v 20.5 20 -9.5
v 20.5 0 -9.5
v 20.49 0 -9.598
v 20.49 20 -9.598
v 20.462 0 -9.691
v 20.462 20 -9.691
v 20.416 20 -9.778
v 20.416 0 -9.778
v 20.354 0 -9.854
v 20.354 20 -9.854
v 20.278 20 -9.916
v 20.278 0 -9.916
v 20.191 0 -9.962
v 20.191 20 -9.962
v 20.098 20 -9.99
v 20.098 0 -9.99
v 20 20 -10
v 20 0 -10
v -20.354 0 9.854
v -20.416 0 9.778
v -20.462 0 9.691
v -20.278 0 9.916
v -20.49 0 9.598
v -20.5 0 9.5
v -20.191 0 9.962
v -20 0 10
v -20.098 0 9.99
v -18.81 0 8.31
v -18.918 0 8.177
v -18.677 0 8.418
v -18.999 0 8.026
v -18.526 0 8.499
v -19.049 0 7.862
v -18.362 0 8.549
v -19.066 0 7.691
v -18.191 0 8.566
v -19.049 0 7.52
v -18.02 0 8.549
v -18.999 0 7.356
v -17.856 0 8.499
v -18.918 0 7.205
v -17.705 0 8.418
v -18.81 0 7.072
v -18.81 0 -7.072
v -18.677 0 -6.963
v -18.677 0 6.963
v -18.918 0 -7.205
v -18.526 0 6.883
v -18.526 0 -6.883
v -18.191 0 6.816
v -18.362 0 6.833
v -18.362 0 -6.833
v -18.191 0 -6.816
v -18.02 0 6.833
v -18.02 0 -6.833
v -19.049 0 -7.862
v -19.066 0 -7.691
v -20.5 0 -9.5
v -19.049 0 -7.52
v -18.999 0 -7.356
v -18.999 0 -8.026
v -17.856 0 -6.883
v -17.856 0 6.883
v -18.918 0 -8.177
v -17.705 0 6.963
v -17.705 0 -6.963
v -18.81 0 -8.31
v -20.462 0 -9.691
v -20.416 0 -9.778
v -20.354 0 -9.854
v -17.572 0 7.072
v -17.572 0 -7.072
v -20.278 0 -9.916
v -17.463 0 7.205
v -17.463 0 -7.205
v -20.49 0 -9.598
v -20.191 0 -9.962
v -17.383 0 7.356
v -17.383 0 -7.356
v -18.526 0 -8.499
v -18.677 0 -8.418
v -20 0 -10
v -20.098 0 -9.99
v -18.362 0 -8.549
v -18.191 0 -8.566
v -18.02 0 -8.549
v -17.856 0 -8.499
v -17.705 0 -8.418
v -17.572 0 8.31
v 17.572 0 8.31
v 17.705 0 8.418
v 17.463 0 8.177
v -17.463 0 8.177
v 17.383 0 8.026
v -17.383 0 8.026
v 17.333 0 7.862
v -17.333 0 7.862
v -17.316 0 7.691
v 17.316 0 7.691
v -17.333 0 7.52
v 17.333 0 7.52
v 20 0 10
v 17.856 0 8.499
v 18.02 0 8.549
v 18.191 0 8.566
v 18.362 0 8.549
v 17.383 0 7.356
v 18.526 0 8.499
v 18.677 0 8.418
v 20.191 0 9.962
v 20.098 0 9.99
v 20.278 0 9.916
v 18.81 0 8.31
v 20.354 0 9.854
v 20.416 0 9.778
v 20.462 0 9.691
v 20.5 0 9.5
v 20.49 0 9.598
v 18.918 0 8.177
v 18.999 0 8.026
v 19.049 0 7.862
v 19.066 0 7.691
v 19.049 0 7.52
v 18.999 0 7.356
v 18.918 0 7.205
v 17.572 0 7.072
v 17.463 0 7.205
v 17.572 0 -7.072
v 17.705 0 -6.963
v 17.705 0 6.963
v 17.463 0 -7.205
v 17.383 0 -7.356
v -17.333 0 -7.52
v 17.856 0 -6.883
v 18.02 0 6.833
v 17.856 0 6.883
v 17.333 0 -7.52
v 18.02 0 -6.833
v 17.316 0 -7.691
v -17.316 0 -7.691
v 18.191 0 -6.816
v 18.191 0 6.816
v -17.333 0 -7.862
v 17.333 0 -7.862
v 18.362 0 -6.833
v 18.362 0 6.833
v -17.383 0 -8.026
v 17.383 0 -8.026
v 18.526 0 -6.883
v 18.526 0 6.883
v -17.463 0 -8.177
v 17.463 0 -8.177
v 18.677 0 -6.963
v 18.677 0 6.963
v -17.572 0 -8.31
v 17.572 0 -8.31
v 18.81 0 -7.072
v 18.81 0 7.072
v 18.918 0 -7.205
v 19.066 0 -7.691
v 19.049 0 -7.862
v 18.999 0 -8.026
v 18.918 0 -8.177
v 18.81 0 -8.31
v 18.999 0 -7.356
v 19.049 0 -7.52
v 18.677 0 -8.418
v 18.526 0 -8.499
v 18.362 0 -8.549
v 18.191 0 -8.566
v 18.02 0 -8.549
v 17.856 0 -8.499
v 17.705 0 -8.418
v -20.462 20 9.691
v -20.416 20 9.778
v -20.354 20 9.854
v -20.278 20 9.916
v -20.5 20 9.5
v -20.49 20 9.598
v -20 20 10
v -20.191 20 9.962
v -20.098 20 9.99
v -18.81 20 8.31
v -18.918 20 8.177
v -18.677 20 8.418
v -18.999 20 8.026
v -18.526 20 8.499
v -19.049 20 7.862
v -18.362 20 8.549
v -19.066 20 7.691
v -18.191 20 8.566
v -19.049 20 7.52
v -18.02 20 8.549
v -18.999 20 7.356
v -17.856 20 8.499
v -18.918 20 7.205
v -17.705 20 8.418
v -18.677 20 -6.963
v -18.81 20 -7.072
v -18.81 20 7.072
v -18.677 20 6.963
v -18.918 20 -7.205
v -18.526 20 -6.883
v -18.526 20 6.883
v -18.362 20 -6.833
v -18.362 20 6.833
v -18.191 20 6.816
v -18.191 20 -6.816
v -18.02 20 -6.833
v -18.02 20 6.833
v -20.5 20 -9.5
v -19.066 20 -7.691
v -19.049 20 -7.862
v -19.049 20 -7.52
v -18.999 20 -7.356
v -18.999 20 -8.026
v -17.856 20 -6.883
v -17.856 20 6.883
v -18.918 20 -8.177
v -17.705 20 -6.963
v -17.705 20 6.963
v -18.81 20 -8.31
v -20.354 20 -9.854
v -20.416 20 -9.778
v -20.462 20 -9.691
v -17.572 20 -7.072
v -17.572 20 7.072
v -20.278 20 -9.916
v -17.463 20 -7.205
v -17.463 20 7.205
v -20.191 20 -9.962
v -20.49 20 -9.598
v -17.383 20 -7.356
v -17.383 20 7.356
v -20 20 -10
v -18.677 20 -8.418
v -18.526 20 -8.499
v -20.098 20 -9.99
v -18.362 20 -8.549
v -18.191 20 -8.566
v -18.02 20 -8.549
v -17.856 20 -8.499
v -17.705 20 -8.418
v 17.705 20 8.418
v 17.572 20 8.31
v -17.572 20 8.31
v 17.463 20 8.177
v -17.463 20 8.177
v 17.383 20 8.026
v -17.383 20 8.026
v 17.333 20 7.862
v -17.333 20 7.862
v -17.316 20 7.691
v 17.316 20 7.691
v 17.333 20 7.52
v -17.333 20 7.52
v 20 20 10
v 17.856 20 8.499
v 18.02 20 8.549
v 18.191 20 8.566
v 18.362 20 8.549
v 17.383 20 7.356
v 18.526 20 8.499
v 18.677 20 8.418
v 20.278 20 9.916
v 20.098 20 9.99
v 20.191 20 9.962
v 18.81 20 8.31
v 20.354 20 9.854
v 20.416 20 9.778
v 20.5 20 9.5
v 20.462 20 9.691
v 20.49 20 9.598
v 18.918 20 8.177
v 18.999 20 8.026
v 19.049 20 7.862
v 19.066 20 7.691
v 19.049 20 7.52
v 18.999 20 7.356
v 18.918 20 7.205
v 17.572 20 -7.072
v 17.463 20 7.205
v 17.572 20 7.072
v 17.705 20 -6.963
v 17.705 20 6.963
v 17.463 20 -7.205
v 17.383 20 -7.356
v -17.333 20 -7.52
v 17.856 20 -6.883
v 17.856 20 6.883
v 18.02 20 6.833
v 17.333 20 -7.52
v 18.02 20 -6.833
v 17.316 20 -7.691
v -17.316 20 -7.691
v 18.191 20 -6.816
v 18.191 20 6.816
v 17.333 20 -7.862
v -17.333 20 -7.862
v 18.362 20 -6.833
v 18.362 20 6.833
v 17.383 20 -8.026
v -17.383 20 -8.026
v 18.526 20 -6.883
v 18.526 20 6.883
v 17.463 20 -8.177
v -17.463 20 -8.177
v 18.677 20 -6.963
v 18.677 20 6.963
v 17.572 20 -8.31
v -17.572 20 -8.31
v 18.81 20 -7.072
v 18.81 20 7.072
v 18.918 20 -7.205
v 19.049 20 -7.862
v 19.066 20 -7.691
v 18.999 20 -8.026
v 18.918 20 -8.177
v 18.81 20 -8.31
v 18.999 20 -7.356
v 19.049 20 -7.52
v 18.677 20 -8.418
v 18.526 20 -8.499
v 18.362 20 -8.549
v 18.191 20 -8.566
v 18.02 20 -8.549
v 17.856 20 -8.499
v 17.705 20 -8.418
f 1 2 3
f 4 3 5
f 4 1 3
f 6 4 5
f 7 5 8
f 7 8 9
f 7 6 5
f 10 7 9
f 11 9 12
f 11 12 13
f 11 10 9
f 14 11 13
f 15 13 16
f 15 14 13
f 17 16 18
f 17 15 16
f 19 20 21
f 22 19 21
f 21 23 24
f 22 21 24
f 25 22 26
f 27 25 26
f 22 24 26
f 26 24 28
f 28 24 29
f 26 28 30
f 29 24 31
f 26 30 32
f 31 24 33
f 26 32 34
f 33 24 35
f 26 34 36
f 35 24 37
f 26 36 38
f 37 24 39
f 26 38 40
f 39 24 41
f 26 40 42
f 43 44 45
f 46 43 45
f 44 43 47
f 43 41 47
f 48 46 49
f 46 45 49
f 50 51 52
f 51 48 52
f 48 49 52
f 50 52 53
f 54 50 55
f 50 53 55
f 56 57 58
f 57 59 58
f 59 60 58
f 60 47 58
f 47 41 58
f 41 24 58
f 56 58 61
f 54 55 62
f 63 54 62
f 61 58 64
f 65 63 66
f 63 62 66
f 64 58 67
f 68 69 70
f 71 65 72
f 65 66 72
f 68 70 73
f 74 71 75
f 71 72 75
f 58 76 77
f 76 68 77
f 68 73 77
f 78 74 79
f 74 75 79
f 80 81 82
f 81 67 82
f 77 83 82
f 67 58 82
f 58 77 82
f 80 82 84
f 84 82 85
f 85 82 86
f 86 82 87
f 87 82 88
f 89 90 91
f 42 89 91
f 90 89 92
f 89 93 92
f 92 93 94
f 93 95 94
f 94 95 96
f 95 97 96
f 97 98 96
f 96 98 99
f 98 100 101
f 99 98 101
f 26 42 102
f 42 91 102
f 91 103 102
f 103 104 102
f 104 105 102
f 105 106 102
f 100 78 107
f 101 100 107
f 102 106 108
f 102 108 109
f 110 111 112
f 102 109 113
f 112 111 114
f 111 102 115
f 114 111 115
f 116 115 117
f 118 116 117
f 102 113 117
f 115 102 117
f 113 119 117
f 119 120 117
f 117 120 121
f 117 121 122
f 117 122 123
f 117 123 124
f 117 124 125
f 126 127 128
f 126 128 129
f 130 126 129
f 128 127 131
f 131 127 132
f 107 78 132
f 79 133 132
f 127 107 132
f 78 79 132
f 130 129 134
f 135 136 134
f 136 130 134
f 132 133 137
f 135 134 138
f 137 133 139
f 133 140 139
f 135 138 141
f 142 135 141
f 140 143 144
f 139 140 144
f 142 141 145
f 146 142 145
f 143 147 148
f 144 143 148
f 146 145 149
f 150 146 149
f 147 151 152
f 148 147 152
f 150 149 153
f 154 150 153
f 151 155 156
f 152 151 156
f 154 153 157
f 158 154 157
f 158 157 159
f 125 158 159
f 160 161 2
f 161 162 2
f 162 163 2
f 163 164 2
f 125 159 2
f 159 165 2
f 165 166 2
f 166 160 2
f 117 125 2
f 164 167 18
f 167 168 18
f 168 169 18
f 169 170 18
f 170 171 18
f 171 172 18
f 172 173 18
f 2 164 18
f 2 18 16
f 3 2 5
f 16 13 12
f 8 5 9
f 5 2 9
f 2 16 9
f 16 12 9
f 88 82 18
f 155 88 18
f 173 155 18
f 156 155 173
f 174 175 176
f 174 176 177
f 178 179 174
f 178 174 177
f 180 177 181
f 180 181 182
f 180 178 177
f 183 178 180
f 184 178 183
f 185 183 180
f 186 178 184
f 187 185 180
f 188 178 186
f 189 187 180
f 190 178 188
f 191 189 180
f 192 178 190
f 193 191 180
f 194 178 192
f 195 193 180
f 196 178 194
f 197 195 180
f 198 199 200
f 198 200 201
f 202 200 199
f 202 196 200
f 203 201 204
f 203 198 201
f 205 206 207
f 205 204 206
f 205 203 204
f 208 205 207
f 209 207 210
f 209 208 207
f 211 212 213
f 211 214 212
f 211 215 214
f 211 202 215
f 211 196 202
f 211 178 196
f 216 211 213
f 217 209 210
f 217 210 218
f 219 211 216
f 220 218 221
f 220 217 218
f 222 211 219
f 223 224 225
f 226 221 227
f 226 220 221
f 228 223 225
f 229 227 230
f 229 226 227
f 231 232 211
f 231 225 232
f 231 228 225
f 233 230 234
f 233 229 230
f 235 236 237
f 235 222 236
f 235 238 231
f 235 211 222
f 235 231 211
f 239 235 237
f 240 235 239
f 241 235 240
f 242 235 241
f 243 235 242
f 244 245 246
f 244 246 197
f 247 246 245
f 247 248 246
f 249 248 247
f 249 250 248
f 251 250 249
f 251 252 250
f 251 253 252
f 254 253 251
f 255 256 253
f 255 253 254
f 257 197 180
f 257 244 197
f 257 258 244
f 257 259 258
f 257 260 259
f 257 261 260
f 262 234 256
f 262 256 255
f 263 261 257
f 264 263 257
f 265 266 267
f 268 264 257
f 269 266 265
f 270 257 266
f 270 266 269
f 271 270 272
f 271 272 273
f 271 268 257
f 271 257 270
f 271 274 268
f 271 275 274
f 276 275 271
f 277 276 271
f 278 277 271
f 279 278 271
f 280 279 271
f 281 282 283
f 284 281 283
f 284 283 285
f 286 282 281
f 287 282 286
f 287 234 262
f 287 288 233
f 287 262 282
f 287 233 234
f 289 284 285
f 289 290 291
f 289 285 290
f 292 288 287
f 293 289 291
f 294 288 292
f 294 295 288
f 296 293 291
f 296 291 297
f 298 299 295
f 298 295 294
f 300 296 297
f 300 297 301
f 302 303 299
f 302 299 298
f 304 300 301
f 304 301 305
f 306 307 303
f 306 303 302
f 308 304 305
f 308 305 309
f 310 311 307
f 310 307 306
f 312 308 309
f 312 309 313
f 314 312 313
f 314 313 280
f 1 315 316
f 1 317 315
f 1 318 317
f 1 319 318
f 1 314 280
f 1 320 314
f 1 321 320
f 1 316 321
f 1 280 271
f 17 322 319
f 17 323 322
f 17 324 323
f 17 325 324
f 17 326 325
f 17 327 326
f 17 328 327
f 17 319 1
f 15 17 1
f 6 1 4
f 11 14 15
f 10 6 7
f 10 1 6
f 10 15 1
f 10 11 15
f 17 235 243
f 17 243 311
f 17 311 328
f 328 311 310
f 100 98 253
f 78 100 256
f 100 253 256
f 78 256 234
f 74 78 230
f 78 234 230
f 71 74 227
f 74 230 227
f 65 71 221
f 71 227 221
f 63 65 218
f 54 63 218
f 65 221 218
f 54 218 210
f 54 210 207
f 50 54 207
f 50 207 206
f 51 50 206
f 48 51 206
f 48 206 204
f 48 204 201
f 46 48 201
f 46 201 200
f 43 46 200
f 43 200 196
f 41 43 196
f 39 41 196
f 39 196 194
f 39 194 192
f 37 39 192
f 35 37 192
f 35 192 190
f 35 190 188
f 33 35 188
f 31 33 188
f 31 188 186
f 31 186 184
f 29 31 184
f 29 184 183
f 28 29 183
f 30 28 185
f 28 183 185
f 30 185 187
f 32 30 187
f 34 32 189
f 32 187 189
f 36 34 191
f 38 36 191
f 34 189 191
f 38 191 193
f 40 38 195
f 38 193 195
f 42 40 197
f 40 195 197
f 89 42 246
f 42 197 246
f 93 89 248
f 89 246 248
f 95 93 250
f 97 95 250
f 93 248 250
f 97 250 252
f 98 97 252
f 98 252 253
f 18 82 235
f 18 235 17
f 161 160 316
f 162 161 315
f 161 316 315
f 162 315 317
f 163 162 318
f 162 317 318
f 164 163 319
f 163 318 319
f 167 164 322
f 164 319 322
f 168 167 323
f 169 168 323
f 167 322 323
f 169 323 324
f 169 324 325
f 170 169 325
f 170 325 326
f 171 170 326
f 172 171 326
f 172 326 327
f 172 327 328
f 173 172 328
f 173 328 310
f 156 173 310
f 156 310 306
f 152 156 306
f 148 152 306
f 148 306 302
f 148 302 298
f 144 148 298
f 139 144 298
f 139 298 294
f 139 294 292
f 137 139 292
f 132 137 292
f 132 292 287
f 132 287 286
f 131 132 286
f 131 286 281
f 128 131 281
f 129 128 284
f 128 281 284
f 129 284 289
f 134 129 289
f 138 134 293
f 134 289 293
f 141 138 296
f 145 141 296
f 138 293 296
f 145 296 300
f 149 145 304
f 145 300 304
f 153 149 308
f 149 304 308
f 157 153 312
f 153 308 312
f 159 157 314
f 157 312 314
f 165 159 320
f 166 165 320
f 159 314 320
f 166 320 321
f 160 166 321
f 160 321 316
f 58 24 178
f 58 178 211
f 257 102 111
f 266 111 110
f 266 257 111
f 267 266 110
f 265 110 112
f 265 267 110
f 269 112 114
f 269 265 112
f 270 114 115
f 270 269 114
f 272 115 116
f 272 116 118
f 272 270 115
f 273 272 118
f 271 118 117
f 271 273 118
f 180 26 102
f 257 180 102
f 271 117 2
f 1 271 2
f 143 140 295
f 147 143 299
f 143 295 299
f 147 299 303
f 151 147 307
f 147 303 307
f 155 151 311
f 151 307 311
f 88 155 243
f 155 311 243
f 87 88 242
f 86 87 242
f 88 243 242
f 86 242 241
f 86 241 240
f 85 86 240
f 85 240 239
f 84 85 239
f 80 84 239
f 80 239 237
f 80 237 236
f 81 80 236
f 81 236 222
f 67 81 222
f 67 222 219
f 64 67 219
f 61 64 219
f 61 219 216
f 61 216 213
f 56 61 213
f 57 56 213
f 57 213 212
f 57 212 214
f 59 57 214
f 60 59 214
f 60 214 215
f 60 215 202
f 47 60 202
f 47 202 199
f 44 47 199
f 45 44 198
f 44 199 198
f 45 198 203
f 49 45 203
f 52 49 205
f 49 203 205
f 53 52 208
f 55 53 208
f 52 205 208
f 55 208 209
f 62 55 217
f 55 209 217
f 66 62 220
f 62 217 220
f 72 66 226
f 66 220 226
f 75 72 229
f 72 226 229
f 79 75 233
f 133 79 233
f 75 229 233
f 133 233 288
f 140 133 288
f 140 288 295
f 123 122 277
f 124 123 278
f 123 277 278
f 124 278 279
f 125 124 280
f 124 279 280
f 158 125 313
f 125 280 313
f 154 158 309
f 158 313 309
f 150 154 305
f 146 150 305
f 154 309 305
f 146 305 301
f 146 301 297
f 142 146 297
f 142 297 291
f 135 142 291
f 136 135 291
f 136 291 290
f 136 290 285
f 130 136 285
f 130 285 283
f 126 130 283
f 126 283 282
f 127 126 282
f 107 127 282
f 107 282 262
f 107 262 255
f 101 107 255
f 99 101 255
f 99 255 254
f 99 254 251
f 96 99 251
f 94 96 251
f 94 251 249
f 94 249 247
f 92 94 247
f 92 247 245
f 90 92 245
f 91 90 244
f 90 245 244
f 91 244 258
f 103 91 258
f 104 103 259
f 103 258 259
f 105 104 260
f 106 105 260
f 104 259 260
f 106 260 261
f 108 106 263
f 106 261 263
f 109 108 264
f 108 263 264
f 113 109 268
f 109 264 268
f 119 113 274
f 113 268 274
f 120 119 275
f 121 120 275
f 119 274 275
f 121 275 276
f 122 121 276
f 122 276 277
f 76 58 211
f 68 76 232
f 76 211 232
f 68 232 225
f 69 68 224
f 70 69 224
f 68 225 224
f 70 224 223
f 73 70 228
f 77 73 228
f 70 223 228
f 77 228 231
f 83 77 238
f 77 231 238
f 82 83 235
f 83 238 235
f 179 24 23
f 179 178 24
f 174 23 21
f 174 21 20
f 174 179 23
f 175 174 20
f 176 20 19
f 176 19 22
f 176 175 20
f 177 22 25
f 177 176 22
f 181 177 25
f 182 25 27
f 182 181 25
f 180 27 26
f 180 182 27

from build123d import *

# Parameters (mm, degrees)
SKETCH2_W           = 41
SKETCH2_H           = 20
BOSS_EXTRUDE1_DEPTH = 20
FILLET1_R           = 0.5
SKETCH3_R           = 0.875
CUT_EXTRUDE1_DEPTH  = 21


with BuildPart() as part:
    # Sketch2 → Boss-Extrude1 (new body)
    with BuildSketch(Plane(origin=(0, 0, 0), x_dir=(1, 0, 0), z_dir=(0, 1, 0))):
        Rectangle(SKETCH2_W, SKETCH2_H)
    extrude(amount=BOSS_EXTRUDE1_DEPTH)

    # Fillet1
    fillet1_edges = [part.edges().sort_by_distance(p)[0] for p in [
        (20.5, 10, 10),
        (-20.5, 10, 10),
        (-20.5, 10, -10),
        (20.5, 10, -10),
    ]]
    fillet(fillet1_edges, radius=FILLET1_R)

    # Sketch3 → Cut-Extrude1 (cut, through all)
    with BuildSketch(Plane(origin=(0, 20, 0), x_dir=(1, 0, 0), z_dir=(0, 1, 0))):
        with Locations((18.190909091, 7.690909091)):
            Circle(SKETCH3_R)
        with Locations((18.190909091, -7.690909091)):
            Circle(SKETCH3_R)
        with Locations((-18.190909091, 7.690909091)):
            Circle(SKETCH3_R)
        with Locations((-18.190909091, -7.690909091)):
            Circle(SKETCH3_R)
    extrude(amount=-CUT_EXTRUDE1_DEPTH, mode=Mode.SUBTRACT)


solid = part.part
